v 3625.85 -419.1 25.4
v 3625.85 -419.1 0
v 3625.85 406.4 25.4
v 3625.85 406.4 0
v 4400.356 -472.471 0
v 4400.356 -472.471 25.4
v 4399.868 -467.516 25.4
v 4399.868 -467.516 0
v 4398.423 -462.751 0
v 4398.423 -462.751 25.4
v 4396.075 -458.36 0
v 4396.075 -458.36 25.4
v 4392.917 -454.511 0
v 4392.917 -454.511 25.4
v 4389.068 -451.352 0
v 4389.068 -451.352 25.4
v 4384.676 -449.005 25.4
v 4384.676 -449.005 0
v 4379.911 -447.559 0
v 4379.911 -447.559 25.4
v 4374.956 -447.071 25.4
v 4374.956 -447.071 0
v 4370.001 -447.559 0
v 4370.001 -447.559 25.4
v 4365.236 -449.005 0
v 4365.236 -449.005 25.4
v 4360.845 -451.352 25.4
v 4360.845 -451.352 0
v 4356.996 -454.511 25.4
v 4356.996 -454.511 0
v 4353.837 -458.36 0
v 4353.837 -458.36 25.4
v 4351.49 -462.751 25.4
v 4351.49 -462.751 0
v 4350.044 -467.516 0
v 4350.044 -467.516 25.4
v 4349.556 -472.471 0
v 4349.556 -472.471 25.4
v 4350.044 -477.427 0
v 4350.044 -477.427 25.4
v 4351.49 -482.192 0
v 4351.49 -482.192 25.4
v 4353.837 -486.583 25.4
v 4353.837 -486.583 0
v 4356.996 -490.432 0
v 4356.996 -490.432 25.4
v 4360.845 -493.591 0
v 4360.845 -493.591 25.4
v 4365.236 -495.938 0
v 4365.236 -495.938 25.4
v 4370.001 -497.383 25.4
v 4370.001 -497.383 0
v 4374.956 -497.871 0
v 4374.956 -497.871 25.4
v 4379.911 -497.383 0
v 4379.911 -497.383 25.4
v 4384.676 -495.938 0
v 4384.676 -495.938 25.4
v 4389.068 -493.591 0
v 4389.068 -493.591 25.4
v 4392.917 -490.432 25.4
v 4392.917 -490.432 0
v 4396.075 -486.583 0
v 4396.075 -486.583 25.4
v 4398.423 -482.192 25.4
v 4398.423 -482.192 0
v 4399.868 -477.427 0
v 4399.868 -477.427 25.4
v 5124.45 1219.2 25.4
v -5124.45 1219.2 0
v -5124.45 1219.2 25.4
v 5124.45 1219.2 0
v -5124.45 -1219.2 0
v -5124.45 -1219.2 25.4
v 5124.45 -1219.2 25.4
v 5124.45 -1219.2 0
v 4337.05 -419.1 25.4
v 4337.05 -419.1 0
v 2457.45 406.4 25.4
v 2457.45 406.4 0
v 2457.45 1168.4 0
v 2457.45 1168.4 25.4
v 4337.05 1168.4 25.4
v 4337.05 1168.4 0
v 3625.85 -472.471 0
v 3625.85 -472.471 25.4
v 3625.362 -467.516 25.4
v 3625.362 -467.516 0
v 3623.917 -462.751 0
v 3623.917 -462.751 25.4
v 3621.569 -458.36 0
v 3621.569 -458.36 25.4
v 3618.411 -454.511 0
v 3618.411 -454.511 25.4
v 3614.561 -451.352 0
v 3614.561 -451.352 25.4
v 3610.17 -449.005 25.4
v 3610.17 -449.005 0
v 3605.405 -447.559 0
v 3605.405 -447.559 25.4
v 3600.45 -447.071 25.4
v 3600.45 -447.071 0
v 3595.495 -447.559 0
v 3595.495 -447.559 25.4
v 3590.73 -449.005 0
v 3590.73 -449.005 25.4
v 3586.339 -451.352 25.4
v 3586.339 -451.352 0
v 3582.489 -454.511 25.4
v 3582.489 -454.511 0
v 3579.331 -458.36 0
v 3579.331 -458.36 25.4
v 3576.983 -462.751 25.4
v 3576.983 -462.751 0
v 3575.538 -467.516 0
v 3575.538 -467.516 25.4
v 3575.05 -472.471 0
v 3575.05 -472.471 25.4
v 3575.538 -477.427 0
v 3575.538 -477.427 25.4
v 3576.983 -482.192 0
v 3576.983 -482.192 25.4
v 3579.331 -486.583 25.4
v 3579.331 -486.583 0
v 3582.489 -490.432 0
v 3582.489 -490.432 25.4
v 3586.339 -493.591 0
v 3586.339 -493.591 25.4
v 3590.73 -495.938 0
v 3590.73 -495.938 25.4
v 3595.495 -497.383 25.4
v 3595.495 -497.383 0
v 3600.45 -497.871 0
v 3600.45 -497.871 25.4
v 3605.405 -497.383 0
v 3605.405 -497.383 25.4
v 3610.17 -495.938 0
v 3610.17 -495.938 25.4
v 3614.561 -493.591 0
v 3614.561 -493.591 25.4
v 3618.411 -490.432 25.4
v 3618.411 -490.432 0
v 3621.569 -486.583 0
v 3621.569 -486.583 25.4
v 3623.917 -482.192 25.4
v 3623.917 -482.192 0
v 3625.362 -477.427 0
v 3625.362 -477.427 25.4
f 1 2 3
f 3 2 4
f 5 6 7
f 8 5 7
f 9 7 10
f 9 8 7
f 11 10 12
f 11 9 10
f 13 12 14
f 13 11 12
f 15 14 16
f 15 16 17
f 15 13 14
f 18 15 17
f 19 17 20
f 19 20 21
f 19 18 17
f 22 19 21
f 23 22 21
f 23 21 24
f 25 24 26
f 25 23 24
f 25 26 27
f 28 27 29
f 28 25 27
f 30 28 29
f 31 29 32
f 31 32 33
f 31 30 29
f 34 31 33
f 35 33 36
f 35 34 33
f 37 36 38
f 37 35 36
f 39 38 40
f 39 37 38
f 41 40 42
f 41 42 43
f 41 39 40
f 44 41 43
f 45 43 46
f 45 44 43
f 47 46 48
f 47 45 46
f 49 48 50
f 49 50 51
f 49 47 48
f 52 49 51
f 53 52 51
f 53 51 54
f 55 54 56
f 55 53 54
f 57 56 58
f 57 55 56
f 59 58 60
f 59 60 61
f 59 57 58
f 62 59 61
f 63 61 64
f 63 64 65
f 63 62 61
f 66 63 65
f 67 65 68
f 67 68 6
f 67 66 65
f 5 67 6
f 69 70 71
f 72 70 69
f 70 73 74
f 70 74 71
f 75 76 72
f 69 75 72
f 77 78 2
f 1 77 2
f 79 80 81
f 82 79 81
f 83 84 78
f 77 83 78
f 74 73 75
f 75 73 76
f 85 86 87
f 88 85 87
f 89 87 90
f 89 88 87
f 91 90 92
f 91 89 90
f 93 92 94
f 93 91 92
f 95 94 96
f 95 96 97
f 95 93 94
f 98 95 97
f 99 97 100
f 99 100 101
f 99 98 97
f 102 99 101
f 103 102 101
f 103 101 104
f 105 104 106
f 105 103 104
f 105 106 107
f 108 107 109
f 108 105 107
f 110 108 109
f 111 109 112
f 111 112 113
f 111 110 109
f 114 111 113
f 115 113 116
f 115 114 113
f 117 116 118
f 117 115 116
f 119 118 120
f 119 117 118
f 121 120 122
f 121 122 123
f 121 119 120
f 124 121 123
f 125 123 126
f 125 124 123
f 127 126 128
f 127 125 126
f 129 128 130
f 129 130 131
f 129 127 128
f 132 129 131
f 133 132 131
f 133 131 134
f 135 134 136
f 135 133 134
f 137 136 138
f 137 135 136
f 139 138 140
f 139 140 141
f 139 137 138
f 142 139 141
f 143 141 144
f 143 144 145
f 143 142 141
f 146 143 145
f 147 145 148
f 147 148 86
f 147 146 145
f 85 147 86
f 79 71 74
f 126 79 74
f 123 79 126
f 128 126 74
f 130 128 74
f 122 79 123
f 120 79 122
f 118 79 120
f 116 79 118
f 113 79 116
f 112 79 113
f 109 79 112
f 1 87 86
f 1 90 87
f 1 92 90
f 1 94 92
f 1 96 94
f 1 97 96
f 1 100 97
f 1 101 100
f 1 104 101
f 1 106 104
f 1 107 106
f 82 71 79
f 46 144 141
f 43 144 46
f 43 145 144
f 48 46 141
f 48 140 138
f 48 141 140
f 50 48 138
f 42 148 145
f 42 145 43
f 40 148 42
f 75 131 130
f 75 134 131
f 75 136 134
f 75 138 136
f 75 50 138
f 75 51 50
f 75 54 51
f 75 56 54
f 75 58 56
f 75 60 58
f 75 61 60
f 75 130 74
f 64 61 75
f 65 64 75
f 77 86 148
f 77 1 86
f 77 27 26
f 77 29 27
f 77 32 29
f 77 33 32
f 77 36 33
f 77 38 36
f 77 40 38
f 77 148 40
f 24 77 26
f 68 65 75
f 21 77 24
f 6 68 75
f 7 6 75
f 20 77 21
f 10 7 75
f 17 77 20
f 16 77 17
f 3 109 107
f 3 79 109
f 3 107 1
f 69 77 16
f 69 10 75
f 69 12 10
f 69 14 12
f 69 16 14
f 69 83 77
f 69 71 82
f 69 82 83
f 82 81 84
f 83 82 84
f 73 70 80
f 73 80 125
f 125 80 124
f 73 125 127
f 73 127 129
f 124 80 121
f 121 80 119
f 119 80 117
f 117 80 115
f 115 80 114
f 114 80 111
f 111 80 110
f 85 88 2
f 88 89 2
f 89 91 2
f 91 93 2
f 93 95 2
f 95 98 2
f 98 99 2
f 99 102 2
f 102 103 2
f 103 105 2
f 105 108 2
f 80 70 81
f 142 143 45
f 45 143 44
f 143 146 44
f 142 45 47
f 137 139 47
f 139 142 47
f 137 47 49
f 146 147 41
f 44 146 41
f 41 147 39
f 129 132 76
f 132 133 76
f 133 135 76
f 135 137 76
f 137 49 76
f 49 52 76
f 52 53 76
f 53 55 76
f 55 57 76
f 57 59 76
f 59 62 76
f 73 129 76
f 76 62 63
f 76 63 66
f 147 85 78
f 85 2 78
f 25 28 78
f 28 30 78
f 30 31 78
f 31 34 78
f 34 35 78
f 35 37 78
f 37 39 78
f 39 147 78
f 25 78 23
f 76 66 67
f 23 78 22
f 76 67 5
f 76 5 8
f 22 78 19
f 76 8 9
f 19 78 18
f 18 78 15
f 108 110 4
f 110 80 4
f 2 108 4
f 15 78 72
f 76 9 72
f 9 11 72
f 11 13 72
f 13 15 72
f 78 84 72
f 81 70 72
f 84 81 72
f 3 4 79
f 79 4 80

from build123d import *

# Parameters (mm, degrees)
F0_W     = 10248.9
F0_H     = 2438.4
F0_W_2   = 304.8
F0_H_2   = 304.8
F0_R     = 25.4
F1_DEPTH = 25.4


# Not quite as in the source:
# - a feature names something its author has since deleted; it is built from what else it names


with BuildPart() as f1:
    # F0 (on Top) → F1 (new body)
    with BuildSketch(Plane.XY):
        Rectangle(F0_W, F0_H)
        with Locations((-4908.55, -1003.3)):
            Rectangle(F0_W_2, F0_H_2, mode=Mode.SUBTRACT)
        with Locations((1466.85, -1003.3)):
            Rectangle(F0_W_2, F0_H_2, mode=Mode.SUBTRACT)
        with Locations((3600.45, -472.4713563919)):
            Circle(F0_R, mode=Mode.SUBTRACT)
        with Locations((4374.9561309814, -472.4713563919)):
            Circle(F0_R, mode=Mode.SUBTRACT)
        with Locations((-4908.55, 1003.3)):
            Rectangle(F0_W_2, F0_H_2, mode=Mode.SUBTRACT)
        with Locations((2397.383928299, 328.731328249)):
            Circle(F0_R, mode=Mode.SUBTRACT)
        with Locations((3600.45, 328.731328249)):
            Circle(F0_R, mode=Mode.SUBTRACT)
        Polygon((2457.45, 1168.4), (4337.05, 1168.4), (4337.05, -419.1), (3625.85, -419.1), (3625.85, 328.731328249), (3625.85, 406.4), (2457.45, 406.4), align=None, mode=Mode.SUBTRACT)
        with Locations((1466.85, 1003.3)):
            Rectangle(F0_W_2, F0_H_2, mode=Mode.SUBTRACT)
        with Locations((-4908.55, 1003.3)):
            Rectangle(F0_W_2, F0_H_2)
        with Locations((1466.85, 1003.3)):
            Rectangle(F0_W_2, F0_H_2)
        with Locations((1466.85, -1003.3)):
            Rectangle(F0_W_2, F0_H_2)
        with Locations((-4908.55, -1003.3)):
            Rectangle(F0_W_2, F0_H_2)
        with Locations((3600.45, 328.731328249)):
            Circle(F0_R)
        with Locations((2397.383928299, 328.731328249)):
            Circle(F0_R)
    extrude(amount=F1_DEPTH)


solid = f1.part
